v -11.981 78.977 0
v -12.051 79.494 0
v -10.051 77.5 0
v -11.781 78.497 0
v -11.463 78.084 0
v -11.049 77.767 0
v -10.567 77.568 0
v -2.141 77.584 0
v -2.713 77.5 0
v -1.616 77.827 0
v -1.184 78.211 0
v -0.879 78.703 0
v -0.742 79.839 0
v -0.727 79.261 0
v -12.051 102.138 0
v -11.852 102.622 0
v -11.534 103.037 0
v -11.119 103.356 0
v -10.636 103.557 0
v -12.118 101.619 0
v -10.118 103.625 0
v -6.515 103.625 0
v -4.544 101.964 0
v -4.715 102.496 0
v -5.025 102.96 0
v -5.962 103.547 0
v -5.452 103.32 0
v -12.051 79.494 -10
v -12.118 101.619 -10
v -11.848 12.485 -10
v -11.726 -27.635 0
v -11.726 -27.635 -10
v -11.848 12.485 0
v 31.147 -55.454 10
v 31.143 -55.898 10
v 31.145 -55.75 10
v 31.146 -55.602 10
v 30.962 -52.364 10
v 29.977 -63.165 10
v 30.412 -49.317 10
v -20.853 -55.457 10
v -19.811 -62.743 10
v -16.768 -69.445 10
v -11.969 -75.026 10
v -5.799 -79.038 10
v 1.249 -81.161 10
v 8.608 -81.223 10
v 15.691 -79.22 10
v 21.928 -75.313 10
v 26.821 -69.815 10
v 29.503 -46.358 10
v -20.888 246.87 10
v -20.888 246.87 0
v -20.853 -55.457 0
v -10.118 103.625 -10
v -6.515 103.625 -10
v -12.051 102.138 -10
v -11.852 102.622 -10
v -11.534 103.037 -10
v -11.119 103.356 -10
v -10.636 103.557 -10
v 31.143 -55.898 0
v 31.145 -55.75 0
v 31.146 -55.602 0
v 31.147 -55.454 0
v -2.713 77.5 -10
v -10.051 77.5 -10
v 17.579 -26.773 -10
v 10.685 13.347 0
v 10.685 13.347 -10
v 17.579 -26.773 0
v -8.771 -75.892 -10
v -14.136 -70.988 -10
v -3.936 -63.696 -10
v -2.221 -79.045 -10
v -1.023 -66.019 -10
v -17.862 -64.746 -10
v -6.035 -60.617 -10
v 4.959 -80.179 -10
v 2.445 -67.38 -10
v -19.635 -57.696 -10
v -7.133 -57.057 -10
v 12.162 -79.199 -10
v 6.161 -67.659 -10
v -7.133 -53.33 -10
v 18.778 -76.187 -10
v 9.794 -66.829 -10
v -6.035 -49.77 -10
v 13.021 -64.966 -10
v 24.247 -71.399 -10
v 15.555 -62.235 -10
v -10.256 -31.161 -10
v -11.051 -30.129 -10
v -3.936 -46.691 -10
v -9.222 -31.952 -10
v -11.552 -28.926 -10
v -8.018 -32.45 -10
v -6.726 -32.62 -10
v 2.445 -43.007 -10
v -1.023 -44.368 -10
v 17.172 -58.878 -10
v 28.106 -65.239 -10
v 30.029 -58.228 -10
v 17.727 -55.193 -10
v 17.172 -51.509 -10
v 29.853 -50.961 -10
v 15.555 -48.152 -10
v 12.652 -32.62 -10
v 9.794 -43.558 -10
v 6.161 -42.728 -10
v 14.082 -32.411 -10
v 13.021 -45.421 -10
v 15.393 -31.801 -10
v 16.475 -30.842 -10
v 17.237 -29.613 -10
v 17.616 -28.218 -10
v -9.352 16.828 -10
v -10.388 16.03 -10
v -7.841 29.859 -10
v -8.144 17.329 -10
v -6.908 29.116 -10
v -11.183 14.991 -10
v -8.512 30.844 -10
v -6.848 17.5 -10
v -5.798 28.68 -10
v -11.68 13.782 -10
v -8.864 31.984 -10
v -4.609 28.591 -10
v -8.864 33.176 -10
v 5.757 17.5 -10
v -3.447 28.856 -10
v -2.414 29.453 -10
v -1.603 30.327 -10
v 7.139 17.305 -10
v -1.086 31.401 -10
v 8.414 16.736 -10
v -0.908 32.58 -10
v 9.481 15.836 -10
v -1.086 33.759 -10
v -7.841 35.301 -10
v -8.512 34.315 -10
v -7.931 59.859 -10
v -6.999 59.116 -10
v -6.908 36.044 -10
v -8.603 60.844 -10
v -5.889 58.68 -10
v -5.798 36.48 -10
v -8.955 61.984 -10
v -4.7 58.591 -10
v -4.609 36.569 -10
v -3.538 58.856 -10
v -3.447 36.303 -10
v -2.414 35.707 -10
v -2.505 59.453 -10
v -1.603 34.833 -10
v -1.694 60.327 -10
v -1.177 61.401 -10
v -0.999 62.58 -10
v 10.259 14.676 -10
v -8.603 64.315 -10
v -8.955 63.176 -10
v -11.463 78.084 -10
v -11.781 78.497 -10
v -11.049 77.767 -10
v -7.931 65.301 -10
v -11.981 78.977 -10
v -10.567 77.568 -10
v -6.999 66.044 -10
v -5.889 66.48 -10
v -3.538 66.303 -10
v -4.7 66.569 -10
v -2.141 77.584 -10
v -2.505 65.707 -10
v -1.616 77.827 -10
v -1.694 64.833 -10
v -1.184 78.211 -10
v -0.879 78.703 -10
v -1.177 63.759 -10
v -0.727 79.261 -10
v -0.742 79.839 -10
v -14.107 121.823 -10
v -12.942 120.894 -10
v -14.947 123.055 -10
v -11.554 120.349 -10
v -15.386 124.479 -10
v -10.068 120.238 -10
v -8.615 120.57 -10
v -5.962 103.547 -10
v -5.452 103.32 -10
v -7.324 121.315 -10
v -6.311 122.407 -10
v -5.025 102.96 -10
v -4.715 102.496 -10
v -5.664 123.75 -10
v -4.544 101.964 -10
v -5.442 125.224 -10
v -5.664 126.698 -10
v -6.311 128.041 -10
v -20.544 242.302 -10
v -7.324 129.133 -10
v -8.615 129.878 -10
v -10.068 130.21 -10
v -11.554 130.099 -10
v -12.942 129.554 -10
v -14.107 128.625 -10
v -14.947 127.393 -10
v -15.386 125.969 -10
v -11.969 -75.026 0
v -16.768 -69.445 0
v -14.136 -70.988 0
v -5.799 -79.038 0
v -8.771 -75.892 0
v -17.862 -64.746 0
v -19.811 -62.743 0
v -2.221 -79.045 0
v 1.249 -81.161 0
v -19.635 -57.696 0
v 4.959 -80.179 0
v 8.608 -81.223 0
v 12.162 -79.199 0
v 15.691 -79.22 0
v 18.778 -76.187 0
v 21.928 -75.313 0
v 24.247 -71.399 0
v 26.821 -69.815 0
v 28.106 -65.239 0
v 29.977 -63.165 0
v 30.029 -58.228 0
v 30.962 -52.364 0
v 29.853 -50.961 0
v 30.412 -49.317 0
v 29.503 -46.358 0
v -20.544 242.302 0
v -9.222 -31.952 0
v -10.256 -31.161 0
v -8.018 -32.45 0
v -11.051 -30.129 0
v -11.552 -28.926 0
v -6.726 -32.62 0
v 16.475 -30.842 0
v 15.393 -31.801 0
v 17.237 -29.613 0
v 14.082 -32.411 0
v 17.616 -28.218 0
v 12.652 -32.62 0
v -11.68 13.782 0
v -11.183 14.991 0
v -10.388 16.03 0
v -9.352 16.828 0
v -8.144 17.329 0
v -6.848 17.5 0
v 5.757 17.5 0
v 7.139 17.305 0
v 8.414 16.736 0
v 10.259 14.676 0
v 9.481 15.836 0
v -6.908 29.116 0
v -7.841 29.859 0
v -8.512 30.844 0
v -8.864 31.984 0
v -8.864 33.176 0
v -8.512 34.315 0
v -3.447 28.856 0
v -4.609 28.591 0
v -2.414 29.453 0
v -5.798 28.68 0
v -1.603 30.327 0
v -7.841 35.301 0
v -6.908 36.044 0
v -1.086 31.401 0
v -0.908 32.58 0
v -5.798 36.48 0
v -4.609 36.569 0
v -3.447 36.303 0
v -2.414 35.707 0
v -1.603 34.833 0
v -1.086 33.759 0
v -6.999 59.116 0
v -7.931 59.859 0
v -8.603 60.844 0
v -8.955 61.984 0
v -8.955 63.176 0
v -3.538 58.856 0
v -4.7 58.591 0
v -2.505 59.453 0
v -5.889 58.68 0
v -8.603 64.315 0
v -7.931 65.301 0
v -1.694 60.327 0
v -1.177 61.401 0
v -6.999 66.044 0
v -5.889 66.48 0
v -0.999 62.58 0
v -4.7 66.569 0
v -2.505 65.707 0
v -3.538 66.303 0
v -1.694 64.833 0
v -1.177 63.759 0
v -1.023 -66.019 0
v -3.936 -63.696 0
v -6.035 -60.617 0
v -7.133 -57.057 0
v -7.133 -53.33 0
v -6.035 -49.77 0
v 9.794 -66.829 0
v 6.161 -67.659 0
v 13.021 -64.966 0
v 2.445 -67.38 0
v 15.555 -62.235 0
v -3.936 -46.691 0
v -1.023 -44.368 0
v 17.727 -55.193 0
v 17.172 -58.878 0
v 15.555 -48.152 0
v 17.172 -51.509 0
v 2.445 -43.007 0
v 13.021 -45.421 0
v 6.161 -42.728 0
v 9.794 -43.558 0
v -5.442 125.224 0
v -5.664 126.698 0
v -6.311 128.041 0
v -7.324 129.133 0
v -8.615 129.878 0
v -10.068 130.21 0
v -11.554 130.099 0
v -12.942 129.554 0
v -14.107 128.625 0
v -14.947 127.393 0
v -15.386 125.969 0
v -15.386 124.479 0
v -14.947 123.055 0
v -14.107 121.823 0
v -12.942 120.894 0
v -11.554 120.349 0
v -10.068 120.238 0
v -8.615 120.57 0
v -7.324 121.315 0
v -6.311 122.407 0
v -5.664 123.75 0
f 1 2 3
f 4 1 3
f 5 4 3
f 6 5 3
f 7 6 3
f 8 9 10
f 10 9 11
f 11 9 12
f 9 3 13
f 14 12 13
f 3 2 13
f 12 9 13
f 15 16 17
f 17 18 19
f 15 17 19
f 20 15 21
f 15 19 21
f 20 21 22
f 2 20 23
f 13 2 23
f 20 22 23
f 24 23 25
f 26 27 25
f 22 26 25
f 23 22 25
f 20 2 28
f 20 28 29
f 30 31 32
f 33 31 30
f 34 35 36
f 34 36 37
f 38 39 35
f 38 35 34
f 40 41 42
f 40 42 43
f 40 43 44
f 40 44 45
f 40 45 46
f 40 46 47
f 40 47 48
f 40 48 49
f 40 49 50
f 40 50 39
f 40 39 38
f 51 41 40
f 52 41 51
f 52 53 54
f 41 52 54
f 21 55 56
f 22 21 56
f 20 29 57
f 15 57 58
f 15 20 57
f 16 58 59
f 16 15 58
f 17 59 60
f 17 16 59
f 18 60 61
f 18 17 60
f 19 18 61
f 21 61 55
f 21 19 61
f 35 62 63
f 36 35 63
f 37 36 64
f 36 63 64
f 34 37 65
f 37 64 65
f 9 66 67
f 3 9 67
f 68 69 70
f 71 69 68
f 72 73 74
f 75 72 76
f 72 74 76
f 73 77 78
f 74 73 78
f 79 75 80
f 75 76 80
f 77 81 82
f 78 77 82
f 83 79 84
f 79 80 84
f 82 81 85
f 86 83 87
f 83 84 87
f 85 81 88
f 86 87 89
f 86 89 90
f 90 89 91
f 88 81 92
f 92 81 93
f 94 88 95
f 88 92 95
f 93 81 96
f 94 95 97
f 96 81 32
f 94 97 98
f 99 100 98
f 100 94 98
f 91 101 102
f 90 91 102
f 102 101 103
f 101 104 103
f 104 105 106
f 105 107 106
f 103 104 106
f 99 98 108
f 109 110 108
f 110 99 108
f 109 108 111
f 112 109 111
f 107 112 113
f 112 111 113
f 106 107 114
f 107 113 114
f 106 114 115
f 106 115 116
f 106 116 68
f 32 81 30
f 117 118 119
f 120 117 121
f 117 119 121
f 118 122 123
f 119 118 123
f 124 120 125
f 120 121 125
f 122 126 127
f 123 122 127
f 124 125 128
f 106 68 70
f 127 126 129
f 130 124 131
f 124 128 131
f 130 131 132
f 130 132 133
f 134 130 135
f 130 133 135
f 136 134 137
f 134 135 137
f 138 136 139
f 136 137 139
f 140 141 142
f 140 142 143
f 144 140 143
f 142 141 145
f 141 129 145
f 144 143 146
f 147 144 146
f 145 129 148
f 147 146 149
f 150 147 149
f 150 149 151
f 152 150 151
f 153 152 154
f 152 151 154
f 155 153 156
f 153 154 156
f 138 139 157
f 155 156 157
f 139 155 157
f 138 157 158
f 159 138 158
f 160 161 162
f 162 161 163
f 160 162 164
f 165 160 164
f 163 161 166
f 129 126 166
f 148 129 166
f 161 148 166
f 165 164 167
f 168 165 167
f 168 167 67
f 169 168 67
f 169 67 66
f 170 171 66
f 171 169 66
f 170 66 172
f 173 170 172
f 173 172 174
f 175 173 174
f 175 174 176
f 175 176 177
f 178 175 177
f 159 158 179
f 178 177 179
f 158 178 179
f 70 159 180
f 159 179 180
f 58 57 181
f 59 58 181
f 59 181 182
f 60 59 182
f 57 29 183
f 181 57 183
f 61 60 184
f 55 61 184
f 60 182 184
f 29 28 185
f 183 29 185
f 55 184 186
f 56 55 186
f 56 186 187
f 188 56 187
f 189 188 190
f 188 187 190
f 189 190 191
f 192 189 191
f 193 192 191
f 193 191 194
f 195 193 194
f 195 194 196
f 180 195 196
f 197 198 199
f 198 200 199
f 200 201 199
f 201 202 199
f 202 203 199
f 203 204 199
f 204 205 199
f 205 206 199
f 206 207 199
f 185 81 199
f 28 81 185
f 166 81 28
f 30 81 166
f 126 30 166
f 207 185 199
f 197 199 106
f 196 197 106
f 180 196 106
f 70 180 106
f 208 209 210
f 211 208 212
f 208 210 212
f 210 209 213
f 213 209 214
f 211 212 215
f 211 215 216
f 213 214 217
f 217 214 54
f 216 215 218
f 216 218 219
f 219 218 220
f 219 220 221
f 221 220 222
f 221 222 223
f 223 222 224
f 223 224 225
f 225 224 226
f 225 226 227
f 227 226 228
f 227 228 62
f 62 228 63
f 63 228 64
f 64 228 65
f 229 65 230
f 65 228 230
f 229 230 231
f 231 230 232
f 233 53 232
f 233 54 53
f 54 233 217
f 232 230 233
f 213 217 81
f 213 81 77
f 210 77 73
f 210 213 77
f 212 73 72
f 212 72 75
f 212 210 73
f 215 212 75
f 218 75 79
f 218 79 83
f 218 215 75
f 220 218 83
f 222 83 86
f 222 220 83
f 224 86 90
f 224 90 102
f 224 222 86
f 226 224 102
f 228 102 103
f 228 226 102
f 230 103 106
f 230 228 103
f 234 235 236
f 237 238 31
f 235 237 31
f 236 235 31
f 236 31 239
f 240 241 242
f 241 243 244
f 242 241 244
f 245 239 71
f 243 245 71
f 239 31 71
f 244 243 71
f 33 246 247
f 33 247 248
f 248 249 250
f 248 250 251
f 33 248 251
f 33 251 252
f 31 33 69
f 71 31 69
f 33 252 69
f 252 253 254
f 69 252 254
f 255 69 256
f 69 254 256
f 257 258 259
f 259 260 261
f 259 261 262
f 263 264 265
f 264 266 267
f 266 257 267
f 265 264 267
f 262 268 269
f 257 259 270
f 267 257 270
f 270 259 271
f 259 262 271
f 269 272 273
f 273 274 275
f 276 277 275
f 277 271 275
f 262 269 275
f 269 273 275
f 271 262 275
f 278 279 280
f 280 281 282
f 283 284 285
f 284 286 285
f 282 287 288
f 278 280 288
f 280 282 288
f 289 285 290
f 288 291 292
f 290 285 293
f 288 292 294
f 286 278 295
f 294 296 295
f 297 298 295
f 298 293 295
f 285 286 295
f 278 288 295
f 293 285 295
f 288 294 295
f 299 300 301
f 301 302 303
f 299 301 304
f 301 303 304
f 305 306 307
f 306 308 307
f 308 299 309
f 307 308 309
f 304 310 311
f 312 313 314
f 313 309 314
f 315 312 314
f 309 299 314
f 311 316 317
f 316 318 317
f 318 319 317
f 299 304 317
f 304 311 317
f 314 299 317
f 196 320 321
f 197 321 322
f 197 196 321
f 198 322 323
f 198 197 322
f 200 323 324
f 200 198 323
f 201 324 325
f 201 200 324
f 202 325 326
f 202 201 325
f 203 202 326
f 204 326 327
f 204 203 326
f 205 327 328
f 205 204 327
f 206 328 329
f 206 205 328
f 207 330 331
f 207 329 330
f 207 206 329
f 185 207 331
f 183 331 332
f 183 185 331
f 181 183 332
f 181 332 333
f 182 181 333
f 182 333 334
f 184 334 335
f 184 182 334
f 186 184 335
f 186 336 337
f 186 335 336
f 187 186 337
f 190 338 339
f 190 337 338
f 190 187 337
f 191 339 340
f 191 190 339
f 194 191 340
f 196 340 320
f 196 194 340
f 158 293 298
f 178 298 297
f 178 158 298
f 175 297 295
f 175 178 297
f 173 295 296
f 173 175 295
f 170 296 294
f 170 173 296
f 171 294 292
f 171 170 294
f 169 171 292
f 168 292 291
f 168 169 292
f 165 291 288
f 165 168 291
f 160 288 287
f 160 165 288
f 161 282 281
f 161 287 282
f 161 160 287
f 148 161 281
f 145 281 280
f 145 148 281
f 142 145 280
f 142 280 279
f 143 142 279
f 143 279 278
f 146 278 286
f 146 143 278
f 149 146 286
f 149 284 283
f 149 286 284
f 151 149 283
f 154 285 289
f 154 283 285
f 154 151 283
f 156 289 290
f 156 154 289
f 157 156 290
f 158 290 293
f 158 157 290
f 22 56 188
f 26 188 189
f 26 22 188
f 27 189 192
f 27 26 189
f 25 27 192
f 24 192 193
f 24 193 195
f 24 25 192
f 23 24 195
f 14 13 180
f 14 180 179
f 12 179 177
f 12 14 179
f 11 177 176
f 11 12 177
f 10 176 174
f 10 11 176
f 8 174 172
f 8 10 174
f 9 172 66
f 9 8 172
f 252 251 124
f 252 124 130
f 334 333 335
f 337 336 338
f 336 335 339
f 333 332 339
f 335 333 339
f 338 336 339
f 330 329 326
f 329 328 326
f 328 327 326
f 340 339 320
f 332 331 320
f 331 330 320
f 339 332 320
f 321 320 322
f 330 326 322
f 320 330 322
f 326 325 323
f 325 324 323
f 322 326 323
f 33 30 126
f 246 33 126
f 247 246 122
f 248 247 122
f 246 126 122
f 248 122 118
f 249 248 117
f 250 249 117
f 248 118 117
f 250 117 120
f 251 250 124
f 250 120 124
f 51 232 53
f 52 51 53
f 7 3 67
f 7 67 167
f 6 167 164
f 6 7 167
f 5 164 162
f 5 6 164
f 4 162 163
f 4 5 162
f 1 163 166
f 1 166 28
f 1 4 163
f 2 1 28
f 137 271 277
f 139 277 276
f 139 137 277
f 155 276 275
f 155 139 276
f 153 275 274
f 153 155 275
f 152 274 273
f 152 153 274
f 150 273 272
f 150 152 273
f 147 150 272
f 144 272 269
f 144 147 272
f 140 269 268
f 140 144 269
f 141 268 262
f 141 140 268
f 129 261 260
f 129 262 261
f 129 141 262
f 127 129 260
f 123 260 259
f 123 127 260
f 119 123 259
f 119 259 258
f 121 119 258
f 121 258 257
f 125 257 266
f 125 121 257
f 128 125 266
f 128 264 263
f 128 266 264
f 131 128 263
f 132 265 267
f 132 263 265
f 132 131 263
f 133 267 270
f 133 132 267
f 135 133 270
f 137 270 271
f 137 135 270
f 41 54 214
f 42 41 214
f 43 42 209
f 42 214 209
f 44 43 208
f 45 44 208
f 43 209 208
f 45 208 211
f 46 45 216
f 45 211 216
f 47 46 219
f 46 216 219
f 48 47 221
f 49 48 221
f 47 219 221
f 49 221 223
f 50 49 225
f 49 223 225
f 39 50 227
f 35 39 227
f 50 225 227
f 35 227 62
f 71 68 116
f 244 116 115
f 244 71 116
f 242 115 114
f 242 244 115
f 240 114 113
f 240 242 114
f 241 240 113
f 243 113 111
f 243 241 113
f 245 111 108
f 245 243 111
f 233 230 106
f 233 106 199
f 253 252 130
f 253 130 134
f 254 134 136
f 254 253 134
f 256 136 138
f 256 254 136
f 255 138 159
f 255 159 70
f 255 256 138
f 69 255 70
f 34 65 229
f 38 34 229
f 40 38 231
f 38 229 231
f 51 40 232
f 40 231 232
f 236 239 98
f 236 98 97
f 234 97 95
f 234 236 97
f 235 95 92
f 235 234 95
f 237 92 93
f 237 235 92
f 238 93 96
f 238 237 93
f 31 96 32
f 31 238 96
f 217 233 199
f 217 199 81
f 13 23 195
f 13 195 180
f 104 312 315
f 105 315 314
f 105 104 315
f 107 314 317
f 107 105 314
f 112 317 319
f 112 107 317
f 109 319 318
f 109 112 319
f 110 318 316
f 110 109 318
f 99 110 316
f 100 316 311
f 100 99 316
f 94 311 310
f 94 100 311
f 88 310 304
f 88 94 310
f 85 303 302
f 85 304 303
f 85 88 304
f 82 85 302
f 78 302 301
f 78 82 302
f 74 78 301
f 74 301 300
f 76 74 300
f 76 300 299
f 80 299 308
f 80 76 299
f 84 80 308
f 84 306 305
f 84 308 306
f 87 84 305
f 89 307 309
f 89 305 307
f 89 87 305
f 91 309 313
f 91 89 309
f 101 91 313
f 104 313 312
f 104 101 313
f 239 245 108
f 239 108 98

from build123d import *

# Parameters (mm, degrees)
F0_R     = 4
F0_R_2   = 12.5
F0_R_3   = 5
F1_DEPTH = 10
F3_DEPTH = 10
F5_DEPTH = 10


with BuildPart() as f1:
    # F0 (on Top) → F1 (new body, symmetric)
    with BuildSketch(Plane.XY):
        with BuildLine():
            Line((-20.543962, 242.302258), (-19.634877, -57.696364))
            ThreePointArc((-19.634877, -57.696364), (8.59643, -79.952697), (29.853362, -50.961424))
            Line((29.853362, -50.961424), (-20.543962, 242.302258))
        make_face()
        with BuildLine():
            Line((12.65154, -32.619782), (-6.725958, -32.619782))
            ThreePointArc((-6.725958, -32.619782), (-10.256131, -31.160668), (-11.725935, -27.634933))
            Line((-11.725935, -27.634933), (-11.84751, 12.484849))
            ThreePointArc((-11.84751, 12.484849), (-10.38842, 16.030173), (-6.847533, 17.5))
            Line((-6.847533, 17.5), (5.756961, 17.5))
            ThreePointArc((5.756961, 17.5), (8.979214, 16.32323), (10.684726, 13.346836))
            Line((10.684726, 13.346836), (17.579305, -26.772946))
            ThreePointArc((17.579305, -26.772946), (16.47477, -30.842034), (12.65154, -32.619782))
        make_face(mode=Mode.SUBTRACT)
        with Locations((-4.908372, 32.579835)):
            Circle(F0_R, mode=Mode.SUBTRACT)
        with Locations((-4.999281, 62.579835)):
            Circle(F0_R, mode=Mode.SUBTRACT)
        with Locations((5.226905, -55.193478)):
            Circle(F0_R_2, mode=Mode.SUBTRACT)
        with Locations((-10.44188, 125.224027)):
            Circle(F0_R_3, mode=Mode.SUBTRACT)
        with BuildLine():
            Line((-2.713003, 77.5), (-10.050577, 77.5))
            ThreePointArc((-10.050577, 77.5), (-11.462646, 78.083645), (-12.050567, 79.493939))
            Line((-12.050567, 79.493939), (-12.117614, 101.619189))
            ThreePointArc((-12.117614, 101.619189), (-11.533977, 103.037319), (-10.117623, 103.62525))
            Line((-10.117623, 103.62525), (-6.515225, 103.62525))
            ThreePointArc((-6.515225, 103.62525), (-5.226324, 103.154542), (-4.544118, 101.963984))
            Line((-4.544118, 101.963984), (-0.741897, 79.838734))
            ThreePointArc((-0.741897, 79.838734), (-1.183711, 78.211099), (-2.713003, 77.5))
        make_face(mode=Mode.SUBTRACT)
    extrude(amount=F1_DEPTH, both=True)

    # F2 (on Top) → F3 (join)
    with BuildSketch(Plane.XY):
        with BuildLine():
            Line((-17.758185, 116.28598), (-12.327851, 113.452759))
            Line((-12.327851, 113.452759), (-12.327851, -47.830094))
            ThreePointArc((-12.327851, -47.830094), (1.176909, -74.372973), (23.646388, -54.8275))
            Line((23.646388, -54.8275), (-7.25136, 142.539755))
            Line((-7.25136, 142.539755), (-12.327851, 142.539755))
            Line((-12.327851, 142.539755), (-17.758185, 116.28598))
        make_face()
    extrude(amount=F3_DEPTH)

    # F4 (on Top) → F5 (join)
    with BuildSketch(Plane.XY):
        with BuildLine():
            ThreePointArc((29.503305, -46.357701), (0.523158, -29.868779), (-20.85342, -55.457358))
            ThreePointArc((-20.85342, -55.457358), (4.926275, -81.453466), (31.142796, -55.897952))
            Line((31.142796, -55.897952), (29.503305, -46.357701))
        make_face()
        with BuildLine():
            Line((-20.887821, 246.869915), (-20.85342, -55.457358))
            ThreePointArc((-20.85342, -55.457358), (0.523158, -29.868779), (29.503305, -46.357701))
            Line((29.503305, -46.357701), (-20.887821, 246.869915))
        make_face()
        with BuildLine():
            Line((29.503305, -46.357701), (31.142796, -55.897952))
            ThreePointArc((31.142796, -55.897952), (31.145634, -55.676184), (31.14658, -55.454399))
            ThreePointArc((31.14658, -55.454399), (30.732463, -50.832434), (29.503305, -46.357701))
        make_face()
    extrude(amount=F5_DEPTH)


solid = f1.part
